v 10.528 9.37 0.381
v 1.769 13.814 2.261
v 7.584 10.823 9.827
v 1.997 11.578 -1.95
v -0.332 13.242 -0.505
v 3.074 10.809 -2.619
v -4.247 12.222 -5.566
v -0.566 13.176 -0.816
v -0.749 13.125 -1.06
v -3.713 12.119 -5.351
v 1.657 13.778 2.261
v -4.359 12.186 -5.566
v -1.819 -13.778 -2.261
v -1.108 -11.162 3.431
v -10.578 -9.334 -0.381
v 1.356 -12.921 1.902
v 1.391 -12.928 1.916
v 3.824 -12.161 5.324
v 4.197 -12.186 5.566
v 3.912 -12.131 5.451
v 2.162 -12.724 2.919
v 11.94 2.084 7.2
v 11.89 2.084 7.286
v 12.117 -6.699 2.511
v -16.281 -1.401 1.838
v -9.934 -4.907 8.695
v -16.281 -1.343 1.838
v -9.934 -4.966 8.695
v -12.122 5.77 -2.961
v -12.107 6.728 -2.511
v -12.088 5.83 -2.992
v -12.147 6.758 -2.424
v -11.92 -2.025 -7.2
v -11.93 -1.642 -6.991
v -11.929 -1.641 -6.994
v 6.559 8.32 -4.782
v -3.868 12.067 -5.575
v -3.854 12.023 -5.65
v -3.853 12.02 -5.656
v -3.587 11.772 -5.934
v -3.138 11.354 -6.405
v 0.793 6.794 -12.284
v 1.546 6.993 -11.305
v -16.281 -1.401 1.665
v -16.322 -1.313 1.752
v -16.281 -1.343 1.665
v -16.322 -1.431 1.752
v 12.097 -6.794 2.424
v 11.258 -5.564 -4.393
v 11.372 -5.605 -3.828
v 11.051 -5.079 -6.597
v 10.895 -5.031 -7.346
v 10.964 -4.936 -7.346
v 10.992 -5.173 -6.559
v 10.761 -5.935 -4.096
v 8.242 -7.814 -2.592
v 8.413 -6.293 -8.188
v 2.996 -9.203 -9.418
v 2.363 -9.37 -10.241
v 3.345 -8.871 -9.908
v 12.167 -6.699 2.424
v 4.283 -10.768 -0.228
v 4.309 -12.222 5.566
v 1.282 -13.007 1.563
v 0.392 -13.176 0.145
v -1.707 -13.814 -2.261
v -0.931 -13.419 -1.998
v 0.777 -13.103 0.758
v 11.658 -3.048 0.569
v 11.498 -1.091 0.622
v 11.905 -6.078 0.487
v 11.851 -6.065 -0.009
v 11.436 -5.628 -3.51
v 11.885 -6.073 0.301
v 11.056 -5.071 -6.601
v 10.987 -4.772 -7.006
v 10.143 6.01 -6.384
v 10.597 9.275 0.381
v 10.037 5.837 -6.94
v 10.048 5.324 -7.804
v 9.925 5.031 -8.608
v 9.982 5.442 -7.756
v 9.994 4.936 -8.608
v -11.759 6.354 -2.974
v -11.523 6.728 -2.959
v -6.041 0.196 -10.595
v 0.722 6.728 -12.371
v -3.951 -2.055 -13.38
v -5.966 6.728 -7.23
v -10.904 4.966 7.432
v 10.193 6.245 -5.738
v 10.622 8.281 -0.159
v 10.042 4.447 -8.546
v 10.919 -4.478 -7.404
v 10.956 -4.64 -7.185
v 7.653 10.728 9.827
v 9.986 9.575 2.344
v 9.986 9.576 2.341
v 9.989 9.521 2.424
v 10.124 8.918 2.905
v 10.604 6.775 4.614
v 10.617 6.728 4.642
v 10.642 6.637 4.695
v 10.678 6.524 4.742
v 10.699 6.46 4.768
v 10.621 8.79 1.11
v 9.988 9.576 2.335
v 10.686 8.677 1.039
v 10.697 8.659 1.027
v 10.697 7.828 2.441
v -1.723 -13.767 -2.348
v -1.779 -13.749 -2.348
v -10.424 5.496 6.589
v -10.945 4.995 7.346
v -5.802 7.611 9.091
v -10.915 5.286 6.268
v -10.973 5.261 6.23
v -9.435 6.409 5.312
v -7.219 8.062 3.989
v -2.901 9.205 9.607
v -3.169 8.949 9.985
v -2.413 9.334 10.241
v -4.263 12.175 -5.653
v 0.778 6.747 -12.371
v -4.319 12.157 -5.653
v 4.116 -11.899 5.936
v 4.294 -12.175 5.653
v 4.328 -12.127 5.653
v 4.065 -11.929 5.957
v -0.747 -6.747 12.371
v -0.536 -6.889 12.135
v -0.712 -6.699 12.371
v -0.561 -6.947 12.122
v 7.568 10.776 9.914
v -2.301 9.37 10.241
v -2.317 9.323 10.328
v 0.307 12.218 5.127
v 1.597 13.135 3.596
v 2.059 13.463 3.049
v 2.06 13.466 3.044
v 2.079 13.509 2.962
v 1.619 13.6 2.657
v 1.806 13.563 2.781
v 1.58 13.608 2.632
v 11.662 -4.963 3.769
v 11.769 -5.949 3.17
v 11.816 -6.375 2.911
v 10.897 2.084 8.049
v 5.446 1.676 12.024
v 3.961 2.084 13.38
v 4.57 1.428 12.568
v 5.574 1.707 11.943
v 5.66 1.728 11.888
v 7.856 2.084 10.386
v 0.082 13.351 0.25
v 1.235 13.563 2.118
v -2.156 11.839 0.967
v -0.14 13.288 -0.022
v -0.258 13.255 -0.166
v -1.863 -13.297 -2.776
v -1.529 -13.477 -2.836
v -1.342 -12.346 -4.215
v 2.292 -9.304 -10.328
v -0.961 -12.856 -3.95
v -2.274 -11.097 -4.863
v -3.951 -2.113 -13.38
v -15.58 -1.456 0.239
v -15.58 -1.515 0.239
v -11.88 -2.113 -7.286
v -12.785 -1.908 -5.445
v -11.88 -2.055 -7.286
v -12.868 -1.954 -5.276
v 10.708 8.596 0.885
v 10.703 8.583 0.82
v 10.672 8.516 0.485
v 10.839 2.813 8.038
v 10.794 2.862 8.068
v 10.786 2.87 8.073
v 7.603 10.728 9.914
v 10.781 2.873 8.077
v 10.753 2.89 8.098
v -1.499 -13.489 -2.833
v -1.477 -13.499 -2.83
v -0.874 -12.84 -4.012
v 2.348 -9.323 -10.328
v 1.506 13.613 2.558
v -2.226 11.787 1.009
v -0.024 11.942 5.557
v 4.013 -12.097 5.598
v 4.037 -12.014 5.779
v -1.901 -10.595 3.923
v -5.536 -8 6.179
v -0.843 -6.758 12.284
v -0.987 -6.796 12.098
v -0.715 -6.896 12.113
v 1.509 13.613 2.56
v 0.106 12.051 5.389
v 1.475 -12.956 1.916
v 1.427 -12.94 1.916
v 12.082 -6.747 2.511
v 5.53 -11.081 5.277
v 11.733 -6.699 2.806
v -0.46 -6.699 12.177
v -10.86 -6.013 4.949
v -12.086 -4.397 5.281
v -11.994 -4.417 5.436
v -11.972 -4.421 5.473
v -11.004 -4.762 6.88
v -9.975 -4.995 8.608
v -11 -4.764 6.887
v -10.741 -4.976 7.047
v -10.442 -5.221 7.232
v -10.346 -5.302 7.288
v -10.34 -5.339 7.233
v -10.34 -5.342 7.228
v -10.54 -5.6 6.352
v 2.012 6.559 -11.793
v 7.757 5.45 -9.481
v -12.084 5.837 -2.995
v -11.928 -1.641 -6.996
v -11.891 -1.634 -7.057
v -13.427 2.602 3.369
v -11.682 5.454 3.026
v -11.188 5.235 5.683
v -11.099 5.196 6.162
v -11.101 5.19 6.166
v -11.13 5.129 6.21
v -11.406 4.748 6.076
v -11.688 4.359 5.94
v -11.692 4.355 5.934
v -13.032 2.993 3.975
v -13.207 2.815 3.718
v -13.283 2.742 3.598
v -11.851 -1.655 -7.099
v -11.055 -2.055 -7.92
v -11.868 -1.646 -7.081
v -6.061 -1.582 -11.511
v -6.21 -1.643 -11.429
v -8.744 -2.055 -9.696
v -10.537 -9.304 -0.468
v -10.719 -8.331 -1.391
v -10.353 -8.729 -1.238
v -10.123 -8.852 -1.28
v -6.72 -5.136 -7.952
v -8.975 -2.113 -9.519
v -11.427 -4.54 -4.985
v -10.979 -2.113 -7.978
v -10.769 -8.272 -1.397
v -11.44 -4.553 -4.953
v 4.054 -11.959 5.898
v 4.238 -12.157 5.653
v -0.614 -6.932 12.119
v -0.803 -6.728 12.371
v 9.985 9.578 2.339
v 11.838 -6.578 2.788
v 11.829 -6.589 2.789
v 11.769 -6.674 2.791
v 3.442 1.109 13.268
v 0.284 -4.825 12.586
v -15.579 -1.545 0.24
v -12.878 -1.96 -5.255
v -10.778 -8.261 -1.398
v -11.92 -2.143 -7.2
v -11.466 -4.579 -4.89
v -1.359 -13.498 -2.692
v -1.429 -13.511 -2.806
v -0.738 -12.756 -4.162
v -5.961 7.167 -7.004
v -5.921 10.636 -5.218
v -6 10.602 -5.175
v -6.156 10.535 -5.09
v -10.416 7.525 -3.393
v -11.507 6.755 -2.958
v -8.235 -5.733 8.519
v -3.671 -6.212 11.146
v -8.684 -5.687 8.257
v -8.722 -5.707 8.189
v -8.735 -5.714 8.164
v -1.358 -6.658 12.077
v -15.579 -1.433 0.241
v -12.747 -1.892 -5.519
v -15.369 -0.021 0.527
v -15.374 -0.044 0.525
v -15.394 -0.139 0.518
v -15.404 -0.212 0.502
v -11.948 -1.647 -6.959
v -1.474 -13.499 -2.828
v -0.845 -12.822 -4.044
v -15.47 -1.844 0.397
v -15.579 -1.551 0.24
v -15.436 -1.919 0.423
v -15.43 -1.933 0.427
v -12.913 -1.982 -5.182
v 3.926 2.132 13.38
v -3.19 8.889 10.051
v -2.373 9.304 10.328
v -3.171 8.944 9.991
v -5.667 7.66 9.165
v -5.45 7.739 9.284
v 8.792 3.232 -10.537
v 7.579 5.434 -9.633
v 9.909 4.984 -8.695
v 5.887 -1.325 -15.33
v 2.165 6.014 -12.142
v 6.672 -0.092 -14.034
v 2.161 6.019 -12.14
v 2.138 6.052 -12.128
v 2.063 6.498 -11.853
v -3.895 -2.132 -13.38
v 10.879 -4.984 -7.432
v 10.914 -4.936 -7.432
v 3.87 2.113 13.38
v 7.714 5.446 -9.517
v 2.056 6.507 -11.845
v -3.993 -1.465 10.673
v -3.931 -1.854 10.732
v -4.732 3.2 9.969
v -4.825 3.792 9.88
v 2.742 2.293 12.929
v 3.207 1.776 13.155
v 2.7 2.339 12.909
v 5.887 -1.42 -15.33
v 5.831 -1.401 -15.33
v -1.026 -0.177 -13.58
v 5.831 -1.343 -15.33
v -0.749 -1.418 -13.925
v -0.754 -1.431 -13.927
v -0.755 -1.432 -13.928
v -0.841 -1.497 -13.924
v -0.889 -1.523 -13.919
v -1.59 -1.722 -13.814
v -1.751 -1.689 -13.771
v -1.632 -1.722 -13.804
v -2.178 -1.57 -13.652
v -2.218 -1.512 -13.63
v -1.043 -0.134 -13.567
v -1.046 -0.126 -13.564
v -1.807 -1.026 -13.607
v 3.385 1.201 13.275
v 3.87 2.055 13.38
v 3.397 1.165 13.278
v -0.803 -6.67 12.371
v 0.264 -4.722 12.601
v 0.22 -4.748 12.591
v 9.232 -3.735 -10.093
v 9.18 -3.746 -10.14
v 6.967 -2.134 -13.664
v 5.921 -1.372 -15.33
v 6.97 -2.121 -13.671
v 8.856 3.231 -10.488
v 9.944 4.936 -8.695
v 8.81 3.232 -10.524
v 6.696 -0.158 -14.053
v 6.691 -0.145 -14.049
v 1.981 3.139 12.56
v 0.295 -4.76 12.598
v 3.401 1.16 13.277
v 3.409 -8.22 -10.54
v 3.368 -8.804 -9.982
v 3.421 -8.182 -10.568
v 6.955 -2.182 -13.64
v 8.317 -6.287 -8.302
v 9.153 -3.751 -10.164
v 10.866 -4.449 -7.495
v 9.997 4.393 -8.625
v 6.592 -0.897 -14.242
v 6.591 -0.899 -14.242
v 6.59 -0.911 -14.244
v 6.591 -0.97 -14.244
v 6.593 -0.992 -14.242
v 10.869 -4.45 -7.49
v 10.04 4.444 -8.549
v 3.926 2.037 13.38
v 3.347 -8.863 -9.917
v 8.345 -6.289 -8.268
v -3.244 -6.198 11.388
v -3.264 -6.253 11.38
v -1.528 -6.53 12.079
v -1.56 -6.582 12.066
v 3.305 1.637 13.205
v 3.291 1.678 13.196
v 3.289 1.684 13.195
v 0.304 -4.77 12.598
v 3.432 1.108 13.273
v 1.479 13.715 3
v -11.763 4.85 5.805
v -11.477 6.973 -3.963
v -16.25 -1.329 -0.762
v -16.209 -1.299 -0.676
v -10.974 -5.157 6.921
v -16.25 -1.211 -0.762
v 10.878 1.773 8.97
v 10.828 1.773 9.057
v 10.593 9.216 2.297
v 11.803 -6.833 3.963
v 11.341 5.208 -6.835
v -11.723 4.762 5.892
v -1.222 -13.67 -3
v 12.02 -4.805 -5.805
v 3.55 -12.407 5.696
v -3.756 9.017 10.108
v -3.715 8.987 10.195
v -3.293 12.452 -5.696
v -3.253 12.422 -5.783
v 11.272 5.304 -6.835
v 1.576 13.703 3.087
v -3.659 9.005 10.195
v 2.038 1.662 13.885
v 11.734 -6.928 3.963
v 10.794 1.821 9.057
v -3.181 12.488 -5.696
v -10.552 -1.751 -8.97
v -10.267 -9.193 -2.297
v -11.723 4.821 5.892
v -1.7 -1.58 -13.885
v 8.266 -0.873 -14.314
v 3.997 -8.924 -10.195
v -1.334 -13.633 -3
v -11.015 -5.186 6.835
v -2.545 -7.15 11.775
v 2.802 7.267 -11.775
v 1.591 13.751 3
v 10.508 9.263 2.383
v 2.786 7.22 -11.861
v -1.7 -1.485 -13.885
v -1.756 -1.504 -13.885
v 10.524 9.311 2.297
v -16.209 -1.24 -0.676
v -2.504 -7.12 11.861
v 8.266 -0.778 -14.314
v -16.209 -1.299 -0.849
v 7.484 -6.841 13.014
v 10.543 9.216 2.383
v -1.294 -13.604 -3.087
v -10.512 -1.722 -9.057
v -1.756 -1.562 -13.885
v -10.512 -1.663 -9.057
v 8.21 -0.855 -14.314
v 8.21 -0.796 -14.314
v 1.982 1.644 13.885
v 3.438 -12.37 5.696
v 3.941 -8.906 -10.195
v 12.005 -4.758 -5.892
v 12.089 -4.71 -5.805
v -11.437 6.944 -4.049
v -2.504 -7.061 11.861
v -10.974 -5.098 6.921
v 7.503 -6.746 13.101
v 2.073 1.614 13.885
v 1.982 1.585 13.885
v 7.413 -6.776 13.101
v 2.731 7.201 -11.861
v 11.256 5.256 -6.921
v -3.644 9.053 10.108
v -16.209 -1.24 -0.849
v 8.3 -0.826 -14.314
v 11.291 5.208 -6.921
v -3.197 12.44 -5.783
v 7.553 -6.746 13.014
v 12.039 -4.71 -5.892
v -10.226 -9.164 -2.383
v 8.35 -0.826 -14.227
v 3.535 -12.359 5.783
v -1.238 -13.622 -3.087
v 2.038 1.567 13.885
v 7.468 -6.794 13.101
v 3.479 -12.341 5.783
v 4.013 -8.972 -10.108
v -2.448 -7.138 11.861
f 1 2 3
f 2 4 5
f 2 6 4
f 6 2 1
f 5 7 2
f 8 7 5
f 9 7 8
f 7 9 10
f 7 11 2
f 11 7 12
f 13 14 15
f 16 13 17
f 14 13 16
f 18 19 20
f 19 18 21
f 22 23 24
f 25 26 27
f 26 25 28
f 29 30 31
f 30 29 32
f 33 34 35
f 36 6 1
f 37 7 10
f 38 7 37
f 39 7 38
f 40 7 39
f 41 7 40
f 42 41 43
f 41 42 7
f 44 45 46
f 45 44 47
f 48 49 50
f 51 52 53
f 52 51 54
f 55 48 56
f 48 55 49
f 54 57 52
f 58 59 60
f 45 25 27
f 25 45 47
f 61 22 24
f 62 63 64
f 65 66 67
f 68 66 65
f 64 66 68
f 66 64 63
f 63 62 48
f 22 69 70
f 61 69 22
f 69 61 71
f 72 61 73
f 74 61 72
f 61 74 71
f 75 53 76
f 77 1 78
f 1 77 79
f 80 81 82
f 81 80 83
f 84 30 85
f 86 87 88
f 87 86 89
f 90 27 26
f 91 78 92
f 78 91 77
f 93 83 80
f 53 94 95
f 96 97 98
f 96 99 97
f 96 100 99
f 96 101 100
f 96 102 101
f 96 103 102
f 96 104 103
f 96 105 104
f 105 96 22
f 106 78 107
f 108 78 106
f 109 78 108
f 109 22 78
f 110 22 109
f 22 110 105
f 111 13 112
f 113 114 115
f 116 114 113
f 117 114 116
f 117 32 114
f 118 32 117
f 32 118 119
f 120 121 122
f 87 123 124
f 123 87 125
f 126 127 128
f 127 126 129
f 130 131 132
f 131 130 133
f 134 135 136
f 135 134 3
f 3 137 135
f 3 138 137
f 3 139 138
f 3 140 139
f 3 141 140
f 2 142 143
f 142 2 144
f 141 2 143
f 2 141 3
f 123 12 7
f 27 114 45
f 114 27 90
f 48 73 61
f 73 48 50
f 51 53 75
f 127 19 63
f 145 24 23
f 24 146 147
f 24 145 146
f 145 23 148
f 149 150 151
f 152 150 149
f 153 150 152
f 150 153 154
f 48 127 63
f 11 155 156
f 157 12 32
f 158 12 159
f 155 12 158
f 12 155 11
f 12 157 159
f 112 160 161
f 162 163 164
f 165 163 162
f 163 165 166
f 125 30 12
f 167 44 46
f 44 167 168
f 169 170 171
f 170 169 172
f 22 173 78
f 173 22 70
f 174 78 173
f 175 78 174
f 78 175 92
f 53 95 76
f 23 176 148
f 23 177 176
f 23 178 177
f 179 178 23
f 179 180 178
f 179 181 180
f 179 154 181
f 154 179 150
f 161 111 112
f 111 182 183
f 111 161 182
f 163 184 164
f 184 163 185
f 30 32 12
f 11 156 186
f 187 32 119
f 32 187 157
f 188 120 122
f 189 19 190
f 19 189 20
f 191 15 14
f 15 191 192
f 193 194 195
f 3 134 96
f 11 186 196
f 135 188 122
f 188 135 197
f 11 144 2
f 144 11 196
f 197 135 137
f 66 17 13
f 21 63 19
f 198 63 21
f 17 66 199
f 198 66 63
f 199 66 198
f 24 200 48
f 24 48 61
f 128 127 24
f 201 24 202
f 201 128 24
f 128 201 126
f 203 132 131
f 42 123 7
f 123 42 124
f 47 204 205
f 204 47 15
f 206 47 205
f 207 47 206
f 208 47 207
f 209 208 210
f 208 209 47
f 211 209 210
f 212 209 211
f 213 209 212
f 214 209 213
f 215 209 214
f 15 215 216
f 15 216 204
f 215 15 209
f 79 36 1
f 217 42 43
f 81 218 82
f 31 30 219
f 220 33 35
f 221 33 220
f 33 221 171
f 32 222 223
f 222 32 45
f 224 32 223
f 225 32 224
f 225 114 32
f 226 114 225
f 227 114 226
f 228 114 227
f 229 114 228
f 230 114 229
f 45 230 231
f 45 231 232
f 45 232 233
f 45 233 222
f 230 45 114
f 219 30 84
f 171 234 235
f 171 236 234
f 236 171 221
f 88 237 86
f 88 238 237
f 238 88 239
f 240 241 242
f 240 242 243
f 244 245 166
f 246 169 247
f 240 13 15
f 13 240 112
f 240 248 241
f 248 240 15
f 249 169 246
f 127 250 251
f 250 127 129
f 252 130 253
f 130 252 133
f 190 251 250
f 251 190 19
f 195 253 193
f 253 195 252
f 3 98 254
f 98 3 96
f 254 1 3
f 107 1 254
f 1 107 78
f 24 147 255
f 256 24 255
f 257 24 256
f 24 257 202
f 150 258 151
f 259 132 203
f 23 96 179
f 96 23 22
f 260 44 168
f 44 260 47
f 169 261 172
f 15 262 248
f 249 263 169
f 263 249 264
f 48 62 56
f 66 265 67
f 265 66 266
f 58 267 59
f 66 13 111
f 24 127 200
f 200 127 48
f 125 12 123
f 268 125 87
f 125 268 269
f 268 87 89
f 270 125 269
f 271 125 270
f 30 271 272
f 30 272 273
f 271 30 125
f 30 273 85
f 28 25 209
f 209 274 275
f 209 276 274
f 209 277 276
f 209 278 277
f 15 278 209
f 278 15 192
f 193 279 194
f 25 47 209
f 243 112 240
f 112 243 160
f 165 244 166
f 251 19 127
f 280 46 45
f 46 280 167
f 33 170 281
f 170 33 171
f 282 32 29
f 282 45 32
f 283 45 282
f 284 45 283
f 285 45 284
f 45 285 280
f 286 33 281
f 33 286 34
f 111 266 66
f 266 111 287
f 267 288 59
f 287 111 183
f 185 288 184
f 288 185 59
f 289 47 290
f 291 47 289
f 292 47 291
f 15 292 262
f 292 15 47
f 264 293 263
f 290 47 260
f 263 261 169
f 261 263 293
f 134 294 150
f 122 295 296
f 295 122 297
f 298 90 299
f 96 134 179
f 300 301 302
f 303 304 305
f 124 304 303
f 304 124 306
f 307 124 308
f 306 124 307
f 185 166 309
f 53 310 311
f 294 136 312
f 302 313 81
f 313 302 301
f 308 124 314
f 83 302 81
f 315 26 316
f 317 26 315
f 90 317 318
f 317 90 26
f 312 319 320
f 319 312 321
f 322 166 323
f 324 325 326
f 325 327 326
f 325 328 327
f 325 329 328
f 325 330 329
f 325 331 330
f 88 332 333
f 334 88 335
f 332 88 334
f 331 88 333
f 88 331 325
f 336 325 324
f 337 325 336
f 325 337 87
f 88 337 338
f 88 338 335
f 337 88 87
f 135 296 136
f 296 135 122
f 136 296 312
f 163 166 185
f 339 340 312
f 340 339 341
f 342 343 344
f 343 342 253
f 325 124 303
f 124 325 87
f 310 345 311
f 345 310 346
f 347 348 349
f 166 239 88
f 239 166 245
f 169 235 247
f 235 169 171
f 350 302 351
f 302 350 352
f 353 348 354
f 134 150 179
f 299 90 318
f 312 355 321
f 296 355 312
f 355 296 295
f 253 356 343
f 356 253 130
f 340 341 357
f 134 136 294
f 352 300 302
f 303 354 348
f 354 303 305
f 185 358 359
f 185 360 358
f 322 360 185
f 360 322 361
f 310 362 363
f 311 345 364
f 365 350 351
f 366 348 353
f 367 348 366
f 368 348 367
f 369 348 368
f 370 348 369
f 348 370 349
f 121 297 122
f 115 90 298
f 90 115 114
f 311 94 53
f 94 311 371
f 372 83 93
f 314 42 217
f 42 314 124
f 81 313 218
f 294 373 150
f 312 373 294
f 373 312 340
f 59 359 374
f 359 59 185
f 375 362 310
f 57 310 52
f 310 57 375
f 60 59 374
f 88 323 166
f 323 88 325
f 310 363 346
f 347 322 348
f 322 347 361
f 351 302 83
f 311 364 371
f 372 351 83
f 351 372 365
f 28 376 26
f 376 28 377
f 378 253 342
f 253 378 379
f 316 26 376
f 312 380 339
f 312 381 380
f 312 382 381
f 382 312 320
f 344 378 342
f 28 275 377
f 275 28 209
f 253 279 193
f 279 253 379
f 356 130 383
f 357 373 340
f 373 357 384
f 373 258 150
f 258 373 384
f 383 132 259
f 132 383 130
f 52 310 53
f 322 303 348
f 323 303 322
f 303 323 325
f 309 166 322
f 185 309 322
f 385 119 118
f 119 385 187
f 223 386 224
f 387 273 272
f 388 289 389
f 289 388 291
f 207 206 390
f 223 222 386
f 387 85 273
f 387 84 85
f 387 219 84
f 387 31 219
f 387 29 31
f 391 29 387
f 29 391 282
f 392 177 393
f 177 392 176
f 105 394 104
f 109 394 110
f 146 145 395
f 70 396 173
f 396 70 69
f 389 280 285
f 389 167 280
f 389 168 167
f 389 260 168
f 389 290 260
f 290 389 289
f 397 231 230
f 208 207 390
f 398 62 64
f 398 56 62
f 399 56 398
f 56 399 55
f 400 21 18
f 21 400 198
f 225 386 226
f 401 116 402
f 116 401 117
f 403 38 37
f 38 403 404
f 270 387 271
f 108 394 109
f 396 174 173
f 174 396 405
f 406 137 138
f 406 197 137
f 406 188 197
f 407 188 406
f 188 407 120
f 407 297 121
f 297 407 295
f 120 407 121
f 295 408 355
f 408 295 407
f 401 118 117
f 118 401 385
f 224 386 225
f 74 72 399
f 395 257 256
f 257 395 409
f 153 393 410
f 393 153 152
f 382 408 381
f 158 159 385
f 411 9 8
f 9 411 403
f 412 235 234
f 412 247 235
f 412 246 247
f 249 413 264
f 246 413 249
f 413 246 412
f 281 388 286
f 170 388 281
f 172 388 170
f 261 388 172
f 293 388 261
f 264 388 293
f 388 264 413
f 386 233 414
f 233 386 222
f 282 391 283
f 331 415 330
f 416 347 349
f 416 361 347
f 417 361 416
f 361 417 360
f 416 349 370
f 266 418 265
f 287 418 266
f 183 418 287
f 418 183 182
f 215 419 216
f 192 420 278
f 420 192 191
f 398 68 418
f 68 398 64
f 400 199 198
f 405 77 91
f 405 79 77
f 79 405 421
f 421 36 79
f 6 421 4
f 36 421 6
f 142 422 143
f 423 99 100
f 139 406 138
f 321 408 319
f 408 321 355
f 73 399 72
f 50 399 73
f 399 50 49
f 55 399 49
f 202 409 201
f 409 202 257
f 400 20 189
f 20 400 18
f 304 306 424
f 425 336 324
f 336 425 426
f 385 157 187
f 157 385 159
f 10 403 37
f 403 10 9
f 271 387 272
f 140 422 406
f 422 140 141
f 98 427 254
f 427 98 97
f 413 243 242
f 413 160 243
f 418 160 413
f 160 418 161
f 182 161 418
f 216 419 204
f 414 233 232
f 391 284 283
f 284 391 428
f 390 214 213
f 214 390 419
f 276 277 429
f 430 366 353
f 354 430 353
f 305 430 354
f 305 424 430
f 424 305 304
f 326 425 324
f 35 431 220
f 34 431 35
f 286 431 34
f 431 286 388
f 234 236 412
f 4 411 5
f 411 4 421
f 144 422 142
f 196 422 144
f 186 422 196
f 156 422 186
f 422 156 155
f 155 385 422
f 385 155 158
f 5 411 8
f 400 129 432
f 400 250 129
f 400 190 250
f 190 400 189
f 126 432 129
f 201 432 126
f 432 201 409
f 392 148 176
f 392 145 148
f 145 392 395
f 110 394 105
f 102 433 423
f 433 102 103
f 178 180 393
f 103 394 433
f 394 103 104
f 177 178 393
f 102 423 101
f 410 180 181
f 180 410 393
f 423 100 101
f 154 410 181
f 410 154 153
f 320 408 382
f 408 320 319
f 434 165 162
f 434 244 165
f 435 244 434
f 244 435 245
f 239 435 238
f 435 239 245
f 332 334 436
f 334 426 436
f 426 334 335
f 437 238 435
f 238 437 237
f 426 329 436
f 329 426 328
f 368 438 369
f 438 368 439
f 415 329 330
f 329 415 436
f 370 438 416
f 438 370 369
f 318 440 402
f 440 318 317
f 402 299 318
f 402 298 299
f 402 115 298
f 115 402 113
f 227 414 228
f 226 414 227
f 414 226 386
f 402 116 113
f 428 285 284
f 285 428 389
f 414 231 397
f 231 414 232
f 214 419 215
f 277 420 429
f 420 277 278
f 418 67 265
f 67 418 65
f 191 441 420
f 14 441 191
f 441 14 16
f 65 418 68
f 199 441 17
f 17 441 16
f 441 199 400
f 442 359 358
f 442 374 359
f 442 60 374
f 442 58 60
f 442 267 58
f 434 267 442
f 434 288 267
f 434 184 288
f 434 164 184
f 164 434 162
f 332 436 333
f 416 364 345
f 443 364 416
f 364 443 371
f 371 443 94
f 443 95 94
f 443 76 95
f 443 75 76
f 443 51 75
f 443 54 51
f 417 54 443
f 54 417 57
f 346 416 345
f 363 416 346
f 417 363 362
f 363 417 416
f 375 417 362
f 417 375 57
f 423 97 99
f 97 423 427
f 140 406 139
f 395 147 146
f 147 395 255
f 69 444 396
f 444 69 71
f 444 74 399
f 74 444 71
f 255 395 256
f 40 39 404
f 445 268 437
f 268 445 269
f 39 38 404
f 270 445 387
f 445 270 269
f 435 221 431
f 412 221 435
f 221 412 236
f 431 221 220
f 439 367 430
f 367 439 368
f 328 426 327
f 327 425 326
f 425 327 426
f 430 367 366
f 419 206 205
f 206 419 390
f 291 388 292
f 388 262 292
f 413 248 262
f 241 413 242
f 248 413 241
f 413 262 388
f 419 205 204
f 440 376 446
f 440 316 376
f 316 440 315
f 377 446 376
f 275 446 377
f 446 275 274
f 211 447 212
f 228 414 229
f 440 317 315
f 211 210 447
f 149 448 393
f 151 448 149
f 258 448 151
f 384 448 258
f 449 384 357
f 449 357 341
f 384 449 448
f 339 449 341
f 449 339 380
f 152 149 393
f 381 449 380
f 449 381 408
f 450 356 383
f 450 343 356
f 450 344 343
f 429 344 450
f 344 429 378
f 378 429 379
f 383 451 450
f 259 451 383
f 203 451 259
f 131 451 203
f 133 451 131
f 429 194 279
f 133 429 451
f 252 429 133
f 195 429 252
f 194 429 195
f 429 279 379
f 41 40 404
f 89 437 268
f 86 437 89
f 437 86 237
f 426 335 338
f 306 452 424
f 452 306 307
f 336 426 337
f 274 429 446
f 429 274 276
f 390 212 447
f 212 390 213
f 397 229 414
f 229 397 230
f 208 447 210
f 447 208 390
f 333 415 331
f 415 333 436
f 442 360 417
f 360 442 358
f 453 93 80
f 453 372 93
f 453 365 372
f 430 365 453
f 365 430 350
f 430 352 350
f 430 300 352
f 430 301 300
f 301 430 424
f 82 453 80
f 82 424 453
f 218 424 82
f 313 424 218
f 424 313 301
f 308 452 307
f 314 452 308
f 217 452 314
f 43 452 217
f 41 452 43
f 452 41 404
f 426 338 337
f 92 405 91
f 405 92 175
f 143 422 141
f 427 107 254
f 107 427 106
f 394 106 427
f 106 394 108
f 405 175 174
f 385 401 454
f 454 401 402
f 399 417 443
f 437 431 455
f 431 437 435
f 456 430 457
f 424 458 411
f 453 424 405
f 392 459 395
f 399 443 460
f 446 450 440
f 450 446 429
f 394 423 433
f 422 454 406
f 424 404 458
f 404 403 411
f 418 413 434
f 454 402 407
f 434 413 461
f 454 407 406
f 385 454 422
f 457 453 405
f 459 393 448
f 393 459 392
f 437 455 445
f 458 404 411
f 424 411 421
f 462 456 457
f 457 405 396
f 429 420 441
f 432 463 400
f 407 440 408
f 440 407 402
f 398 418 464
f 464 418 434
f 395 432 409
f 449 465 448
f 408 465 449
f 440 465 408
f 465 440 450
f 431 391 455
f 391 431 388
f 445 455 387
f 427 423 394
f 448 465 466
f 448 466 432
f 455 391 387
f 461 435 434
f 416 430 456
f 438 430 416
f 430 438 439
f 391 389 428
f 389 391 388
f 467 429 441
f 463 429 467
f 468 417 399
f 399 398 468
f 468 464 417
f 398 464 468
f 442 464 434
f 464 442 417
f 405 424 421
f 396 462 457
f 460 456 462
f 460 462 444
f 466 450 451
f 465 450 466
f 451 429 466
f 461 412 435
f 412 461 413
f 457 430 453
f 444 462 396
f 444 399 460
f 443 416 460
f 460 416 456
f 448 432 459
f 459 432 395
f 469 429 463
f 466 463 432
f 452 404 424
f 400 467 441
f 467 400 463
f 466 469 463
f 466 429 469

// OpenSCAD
// Auto-generated OpenSCAD file

    inner_points = 10*[[-0.12531678041950284, -1.3574519535518534, -0.3000260109199145], [-0.36746057341550314, 0.8957867730802842, 1.0108452987700864], [0.3981645779138779, -0.8876613539251546, -1.0108452987700864], [0.15602078491787758, 1.3655773727069829, 0.3000260109199145], [1.1703376344459069, -0.6833157024764185, 0.39628853077487575], [1.0778469356862532, 0.17734490632952513, 0.8969968161993667], [-1.0471429311878786, -0.16921948717439553, -0.8969968161993667], [-1.1396336299475323, 0.6914411216315481, -0.39628853077487575], [-0.2463928887078073, -0.7090848095102253, 1.1774700504213524], [1.1240990998859461, 0.520842947907666, -0.6834790050293927], [-1.0933950953875715, -0.5127175287525364, 0.6834790050293927], [0.277096893206182, 0.717210228665355, -1.1774700504213524], [0.3519124137141851, -1.2311593955032956, 0.5696305224586731], [0.20225931947783818, 0.16141872232289847, 1.379793546724183], [1.198923043974558, -0.47102223771210283, -0.5804992451419002], [1.0492699497382112, 0.9215558801140912, 0.2296637791236098], [-1.0185659452398366, -0.9134304609589615, -0.2296637791236098], [-1.1682190394761833, 0.4791476568672325, 0.5804992451419002], [-0.17155531497946344, -0.15329330316776887, -1.379793546724183], [-0.32120840921581034, 1.239284814658425, -0.5696305224586731], [0.7452968962209774, -0.6746243016514798, 1.3014210240601998], [-1.6168689194414103, -0.1269845502290076, -0.0762480675498447], [0.8250174408462159, -0.08256874217359109, -1.4226978450891705]];

    outer_points = 10*[[-0.4278051408840869, 1.2127161463312635, -0.5566217759152233], [-0.17380580954418245, -1.3719247336384077, -0.2261405699168037], [0.17380580954418245, 1.3719247336384077, 0.2261405699168037], [0.4278051408840869, -1.2127161463312635, 0.5566217759152233], [0.9893779464124436, 0.49362248371798856, -0.8608098595411191], [1.0863970578645408, -0.49362248371798856, -0.7345772714927785], [-1.0863970578645408, 0.49362248371798856, 0.7345772714927785], [-0.9893779464124436, -0.49362248371798856, 0.8608098595411191], [-0.3910812087944938, -0.20840674643547916, -1.3293410426713064], [1.1839567074308435, 0.20840674643547916, 0.7199573838305398], [-1.1839567074308435, -0.20840674643547916, -0.7199573838305398], [0.3910812087944938, 0.20840674643547916, 1.3293410426713064], [0.07624615997787965, 0.6698955034849399, -1.2283940854065145], [0.233226379865687, -0.9275004090487542, -1.0241454674564356], [1.0496731257749474, 0.9275004090487542, 0.038141995263304695], [1.2066533456627548, -0.6698955034849399, 0.24239061321338368], [-1.2066533456627548, 0.6698955034849399, -0.24239061321338368], [-1.0496731257749474, -0.9275004090487542, -0.038141995263304695], [-0.233226379865687, 0.9275004090487542, 1.0241454674564356], [-0.07624615997787965, -0.6698955034849399, 1.2283940854065145], [0.5871367924966472, -0.13720650167138226, -1.5243283937879823], [-1.624077516255638, -0.13720650167138226, 0.17515389348918065], [0.7552912676752325, 1.0728158516403192, 0.9827174256902117]];

    // Convex hull for inner set (I)
    module inner_hull() {
        hull() {
            for (p = inner_points) {
                translate(p) sphere(r=0.1);
            }
        }
    }

    // Convex hull for outer set (O) minus inner hull (O \ I)
    module outer_minus_inner() {
        difference() {
            hull() {
                for (p = outer_points) {
                    translate(p) sphere(r=0.1);
                }
            }
            inner_hull(); // Subtract inner hull
        }
    }

    // Convex hull for outer set (O) minus all translated inner hulls
    module outer_minus_AllTranslationInner() {
        difference() {
            hull() {
                for (p = outer_points) {
                    translate(p) sphere(r=0.1);
                }
            }
            hull() {
                translate([0,0,50]) inner_hull();
                translate([0,0,-50]) inner_hull();
            }; // Subtract translated inner hulls
        }
    }

    // Difference between outer_minus_inner and outer_minus_AllTranslationInner
    module outer_minus_inner_diff() {
        difference() {
            // Outer minus inner
            difference() {
                hull() {
                    for (p = outer_points) {
                        translate(p) sphere(r=0.1);
                    }
                }
                inner_hull();
            }

            // Subtract Outer minus AllTranslationInner
            difference() {
                hull() {
                    for (p = outer_points) {
                        translate(p) sphere(r=0.1);
                    }
                }
                hull() {
                    translate([0,0,50]) inner_hull();
                    translate([0,0,-50]) inner_hull();
                };
            }
        }
    }

    // Rendering all with colors applied
    color([1, 0, 0, 0.5]) inner_hull(); // Transparent red
    color([0, 1, 0, 1]) outer_minus_AllTranslationInner(); // Opaque green
    color([1, 1, 0, 1]) outer_minus_inner_diff(); // Opaque yellow
    
